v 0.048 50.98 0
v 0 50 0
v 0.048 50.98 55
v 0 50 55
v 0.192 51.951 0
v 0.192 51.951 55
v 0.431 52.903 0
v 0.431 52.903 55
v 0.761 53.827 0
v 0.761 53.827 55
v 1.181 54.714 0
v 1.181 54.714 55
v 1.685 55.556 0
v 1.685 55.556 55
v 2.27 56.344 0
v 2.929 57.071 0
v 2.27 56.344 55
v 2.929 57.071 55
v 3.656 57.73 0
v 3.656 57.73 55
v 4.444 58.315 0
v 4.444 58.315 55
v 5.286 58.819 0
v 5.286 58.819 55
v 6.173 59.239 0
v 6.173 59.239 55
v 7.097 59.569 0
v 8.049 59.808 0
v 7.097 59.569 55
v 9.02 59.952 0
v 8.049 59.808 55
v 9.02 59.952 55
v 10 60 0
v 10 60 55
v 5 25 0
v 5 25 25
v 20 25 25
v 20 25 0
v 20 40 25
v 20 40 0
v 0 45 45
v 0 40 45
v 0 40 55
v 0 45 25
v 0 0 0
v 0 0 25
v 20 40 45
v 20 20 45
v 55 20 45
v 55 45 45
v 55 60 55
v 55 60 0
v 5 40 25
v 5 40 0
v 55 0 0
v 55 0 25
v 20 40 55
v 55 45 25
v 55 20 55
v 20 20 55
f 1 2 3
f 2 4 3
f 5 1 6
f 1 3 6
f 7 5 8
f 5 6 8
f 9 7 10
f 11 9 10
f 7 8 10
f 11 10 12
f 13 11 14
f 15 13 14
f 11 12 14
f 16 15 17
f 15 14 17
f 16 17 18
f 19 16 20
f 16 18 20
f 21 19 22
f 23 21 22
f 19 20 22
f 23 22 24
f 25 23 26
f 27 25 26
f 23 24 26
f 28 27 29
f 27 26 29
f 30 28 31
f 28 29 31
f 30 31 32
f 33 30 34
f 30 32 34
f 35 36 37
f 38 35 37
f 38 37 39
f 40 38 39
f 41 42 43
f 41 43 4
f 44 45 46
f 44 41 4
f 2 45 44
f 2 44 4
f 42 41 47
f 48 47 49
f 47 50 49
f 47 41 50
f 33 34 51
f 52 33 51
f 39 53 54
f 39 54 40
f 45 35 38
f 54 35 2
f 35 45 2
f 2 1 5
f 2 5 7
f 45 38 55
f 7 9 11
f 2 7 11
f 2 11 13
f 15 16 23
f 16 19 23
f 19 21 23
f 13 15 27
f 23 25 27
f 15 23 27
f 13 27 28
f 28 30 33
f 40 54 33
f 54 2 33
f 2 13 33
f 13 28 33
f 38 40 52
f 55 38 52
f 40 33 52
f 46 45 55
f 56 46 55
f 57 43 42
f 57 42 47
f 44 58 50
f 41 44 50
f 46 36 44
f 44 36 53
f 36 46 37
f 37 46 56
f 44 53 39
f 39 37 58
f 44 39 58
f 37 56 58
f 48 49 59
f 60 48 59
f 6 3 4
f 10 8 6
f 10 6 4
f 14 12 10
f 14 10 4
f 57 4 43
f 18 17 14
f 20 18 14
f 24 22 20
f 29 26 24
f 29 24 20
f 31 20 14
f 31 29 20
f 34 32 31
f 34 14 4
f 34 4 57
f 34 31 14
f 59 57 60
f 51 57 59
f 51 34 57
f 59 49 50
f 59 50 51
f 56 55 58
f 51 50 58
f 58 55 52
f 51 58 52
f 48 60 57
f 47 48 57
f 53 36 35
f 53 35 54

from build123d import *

# Parameters (mm, degrees)
F0_W     = 55
F0_H     = 60
F1_DEPTH = 55
F3_DEPTH = 55.001
F4_R     = 10
F5_W     = 20
F5_H     = 20
F6_DEPTH = 10
F7_W     = 15
F7_H     = 15
F8_DEPTH = 25.001


with BuildPart() as f1:
    # F0 (on Top) → F1 (new body)
    with BuildSketch(Plane.XY):
        with Locations((27.5, 30)):
            Rectangle(F0_W, F0_H)
    extrude(amount=F1_DEPTH)

    # F2 (on face) → F3 (cut, through all)
    with BuildSketch(Plane.YZ.offset(55)):
        Polygon((20, 55), (0, 55), (0, 25), (45, 25), (45, 45), (20, 45), align=None)
    extrude(amount=-F3_DEPTH, mode=Mode.SUBTRACT)

    # F4
    f4_edges = [f1.edges().sort_by_distance(p)[0] for p in [
        (0, 60, 27.5),
    ]]
    fillet(f4_edges, radius=F4_R)

    # F5 (on face) → F6 (cut, through all)
    with BuildSketch(Plane.XY.offset(55)):
        with Locations((10, 30)):
            Rectangle(F5_W, F5_H)
    extrude(amount=-F6_DEPTH, mode=Mode.SUBTRACT)

    # F7 (on face) → F8 (cut, through all)
    with BuildSketch(Plane.XY.offset(25)):
        with Locations((12.5, 32.5)):
            Rectangle(F7_W, F7_H)
    extrude(amount=-F8_DEPTH, mode=Mode.SUBTRACT)


solid = f1.part
